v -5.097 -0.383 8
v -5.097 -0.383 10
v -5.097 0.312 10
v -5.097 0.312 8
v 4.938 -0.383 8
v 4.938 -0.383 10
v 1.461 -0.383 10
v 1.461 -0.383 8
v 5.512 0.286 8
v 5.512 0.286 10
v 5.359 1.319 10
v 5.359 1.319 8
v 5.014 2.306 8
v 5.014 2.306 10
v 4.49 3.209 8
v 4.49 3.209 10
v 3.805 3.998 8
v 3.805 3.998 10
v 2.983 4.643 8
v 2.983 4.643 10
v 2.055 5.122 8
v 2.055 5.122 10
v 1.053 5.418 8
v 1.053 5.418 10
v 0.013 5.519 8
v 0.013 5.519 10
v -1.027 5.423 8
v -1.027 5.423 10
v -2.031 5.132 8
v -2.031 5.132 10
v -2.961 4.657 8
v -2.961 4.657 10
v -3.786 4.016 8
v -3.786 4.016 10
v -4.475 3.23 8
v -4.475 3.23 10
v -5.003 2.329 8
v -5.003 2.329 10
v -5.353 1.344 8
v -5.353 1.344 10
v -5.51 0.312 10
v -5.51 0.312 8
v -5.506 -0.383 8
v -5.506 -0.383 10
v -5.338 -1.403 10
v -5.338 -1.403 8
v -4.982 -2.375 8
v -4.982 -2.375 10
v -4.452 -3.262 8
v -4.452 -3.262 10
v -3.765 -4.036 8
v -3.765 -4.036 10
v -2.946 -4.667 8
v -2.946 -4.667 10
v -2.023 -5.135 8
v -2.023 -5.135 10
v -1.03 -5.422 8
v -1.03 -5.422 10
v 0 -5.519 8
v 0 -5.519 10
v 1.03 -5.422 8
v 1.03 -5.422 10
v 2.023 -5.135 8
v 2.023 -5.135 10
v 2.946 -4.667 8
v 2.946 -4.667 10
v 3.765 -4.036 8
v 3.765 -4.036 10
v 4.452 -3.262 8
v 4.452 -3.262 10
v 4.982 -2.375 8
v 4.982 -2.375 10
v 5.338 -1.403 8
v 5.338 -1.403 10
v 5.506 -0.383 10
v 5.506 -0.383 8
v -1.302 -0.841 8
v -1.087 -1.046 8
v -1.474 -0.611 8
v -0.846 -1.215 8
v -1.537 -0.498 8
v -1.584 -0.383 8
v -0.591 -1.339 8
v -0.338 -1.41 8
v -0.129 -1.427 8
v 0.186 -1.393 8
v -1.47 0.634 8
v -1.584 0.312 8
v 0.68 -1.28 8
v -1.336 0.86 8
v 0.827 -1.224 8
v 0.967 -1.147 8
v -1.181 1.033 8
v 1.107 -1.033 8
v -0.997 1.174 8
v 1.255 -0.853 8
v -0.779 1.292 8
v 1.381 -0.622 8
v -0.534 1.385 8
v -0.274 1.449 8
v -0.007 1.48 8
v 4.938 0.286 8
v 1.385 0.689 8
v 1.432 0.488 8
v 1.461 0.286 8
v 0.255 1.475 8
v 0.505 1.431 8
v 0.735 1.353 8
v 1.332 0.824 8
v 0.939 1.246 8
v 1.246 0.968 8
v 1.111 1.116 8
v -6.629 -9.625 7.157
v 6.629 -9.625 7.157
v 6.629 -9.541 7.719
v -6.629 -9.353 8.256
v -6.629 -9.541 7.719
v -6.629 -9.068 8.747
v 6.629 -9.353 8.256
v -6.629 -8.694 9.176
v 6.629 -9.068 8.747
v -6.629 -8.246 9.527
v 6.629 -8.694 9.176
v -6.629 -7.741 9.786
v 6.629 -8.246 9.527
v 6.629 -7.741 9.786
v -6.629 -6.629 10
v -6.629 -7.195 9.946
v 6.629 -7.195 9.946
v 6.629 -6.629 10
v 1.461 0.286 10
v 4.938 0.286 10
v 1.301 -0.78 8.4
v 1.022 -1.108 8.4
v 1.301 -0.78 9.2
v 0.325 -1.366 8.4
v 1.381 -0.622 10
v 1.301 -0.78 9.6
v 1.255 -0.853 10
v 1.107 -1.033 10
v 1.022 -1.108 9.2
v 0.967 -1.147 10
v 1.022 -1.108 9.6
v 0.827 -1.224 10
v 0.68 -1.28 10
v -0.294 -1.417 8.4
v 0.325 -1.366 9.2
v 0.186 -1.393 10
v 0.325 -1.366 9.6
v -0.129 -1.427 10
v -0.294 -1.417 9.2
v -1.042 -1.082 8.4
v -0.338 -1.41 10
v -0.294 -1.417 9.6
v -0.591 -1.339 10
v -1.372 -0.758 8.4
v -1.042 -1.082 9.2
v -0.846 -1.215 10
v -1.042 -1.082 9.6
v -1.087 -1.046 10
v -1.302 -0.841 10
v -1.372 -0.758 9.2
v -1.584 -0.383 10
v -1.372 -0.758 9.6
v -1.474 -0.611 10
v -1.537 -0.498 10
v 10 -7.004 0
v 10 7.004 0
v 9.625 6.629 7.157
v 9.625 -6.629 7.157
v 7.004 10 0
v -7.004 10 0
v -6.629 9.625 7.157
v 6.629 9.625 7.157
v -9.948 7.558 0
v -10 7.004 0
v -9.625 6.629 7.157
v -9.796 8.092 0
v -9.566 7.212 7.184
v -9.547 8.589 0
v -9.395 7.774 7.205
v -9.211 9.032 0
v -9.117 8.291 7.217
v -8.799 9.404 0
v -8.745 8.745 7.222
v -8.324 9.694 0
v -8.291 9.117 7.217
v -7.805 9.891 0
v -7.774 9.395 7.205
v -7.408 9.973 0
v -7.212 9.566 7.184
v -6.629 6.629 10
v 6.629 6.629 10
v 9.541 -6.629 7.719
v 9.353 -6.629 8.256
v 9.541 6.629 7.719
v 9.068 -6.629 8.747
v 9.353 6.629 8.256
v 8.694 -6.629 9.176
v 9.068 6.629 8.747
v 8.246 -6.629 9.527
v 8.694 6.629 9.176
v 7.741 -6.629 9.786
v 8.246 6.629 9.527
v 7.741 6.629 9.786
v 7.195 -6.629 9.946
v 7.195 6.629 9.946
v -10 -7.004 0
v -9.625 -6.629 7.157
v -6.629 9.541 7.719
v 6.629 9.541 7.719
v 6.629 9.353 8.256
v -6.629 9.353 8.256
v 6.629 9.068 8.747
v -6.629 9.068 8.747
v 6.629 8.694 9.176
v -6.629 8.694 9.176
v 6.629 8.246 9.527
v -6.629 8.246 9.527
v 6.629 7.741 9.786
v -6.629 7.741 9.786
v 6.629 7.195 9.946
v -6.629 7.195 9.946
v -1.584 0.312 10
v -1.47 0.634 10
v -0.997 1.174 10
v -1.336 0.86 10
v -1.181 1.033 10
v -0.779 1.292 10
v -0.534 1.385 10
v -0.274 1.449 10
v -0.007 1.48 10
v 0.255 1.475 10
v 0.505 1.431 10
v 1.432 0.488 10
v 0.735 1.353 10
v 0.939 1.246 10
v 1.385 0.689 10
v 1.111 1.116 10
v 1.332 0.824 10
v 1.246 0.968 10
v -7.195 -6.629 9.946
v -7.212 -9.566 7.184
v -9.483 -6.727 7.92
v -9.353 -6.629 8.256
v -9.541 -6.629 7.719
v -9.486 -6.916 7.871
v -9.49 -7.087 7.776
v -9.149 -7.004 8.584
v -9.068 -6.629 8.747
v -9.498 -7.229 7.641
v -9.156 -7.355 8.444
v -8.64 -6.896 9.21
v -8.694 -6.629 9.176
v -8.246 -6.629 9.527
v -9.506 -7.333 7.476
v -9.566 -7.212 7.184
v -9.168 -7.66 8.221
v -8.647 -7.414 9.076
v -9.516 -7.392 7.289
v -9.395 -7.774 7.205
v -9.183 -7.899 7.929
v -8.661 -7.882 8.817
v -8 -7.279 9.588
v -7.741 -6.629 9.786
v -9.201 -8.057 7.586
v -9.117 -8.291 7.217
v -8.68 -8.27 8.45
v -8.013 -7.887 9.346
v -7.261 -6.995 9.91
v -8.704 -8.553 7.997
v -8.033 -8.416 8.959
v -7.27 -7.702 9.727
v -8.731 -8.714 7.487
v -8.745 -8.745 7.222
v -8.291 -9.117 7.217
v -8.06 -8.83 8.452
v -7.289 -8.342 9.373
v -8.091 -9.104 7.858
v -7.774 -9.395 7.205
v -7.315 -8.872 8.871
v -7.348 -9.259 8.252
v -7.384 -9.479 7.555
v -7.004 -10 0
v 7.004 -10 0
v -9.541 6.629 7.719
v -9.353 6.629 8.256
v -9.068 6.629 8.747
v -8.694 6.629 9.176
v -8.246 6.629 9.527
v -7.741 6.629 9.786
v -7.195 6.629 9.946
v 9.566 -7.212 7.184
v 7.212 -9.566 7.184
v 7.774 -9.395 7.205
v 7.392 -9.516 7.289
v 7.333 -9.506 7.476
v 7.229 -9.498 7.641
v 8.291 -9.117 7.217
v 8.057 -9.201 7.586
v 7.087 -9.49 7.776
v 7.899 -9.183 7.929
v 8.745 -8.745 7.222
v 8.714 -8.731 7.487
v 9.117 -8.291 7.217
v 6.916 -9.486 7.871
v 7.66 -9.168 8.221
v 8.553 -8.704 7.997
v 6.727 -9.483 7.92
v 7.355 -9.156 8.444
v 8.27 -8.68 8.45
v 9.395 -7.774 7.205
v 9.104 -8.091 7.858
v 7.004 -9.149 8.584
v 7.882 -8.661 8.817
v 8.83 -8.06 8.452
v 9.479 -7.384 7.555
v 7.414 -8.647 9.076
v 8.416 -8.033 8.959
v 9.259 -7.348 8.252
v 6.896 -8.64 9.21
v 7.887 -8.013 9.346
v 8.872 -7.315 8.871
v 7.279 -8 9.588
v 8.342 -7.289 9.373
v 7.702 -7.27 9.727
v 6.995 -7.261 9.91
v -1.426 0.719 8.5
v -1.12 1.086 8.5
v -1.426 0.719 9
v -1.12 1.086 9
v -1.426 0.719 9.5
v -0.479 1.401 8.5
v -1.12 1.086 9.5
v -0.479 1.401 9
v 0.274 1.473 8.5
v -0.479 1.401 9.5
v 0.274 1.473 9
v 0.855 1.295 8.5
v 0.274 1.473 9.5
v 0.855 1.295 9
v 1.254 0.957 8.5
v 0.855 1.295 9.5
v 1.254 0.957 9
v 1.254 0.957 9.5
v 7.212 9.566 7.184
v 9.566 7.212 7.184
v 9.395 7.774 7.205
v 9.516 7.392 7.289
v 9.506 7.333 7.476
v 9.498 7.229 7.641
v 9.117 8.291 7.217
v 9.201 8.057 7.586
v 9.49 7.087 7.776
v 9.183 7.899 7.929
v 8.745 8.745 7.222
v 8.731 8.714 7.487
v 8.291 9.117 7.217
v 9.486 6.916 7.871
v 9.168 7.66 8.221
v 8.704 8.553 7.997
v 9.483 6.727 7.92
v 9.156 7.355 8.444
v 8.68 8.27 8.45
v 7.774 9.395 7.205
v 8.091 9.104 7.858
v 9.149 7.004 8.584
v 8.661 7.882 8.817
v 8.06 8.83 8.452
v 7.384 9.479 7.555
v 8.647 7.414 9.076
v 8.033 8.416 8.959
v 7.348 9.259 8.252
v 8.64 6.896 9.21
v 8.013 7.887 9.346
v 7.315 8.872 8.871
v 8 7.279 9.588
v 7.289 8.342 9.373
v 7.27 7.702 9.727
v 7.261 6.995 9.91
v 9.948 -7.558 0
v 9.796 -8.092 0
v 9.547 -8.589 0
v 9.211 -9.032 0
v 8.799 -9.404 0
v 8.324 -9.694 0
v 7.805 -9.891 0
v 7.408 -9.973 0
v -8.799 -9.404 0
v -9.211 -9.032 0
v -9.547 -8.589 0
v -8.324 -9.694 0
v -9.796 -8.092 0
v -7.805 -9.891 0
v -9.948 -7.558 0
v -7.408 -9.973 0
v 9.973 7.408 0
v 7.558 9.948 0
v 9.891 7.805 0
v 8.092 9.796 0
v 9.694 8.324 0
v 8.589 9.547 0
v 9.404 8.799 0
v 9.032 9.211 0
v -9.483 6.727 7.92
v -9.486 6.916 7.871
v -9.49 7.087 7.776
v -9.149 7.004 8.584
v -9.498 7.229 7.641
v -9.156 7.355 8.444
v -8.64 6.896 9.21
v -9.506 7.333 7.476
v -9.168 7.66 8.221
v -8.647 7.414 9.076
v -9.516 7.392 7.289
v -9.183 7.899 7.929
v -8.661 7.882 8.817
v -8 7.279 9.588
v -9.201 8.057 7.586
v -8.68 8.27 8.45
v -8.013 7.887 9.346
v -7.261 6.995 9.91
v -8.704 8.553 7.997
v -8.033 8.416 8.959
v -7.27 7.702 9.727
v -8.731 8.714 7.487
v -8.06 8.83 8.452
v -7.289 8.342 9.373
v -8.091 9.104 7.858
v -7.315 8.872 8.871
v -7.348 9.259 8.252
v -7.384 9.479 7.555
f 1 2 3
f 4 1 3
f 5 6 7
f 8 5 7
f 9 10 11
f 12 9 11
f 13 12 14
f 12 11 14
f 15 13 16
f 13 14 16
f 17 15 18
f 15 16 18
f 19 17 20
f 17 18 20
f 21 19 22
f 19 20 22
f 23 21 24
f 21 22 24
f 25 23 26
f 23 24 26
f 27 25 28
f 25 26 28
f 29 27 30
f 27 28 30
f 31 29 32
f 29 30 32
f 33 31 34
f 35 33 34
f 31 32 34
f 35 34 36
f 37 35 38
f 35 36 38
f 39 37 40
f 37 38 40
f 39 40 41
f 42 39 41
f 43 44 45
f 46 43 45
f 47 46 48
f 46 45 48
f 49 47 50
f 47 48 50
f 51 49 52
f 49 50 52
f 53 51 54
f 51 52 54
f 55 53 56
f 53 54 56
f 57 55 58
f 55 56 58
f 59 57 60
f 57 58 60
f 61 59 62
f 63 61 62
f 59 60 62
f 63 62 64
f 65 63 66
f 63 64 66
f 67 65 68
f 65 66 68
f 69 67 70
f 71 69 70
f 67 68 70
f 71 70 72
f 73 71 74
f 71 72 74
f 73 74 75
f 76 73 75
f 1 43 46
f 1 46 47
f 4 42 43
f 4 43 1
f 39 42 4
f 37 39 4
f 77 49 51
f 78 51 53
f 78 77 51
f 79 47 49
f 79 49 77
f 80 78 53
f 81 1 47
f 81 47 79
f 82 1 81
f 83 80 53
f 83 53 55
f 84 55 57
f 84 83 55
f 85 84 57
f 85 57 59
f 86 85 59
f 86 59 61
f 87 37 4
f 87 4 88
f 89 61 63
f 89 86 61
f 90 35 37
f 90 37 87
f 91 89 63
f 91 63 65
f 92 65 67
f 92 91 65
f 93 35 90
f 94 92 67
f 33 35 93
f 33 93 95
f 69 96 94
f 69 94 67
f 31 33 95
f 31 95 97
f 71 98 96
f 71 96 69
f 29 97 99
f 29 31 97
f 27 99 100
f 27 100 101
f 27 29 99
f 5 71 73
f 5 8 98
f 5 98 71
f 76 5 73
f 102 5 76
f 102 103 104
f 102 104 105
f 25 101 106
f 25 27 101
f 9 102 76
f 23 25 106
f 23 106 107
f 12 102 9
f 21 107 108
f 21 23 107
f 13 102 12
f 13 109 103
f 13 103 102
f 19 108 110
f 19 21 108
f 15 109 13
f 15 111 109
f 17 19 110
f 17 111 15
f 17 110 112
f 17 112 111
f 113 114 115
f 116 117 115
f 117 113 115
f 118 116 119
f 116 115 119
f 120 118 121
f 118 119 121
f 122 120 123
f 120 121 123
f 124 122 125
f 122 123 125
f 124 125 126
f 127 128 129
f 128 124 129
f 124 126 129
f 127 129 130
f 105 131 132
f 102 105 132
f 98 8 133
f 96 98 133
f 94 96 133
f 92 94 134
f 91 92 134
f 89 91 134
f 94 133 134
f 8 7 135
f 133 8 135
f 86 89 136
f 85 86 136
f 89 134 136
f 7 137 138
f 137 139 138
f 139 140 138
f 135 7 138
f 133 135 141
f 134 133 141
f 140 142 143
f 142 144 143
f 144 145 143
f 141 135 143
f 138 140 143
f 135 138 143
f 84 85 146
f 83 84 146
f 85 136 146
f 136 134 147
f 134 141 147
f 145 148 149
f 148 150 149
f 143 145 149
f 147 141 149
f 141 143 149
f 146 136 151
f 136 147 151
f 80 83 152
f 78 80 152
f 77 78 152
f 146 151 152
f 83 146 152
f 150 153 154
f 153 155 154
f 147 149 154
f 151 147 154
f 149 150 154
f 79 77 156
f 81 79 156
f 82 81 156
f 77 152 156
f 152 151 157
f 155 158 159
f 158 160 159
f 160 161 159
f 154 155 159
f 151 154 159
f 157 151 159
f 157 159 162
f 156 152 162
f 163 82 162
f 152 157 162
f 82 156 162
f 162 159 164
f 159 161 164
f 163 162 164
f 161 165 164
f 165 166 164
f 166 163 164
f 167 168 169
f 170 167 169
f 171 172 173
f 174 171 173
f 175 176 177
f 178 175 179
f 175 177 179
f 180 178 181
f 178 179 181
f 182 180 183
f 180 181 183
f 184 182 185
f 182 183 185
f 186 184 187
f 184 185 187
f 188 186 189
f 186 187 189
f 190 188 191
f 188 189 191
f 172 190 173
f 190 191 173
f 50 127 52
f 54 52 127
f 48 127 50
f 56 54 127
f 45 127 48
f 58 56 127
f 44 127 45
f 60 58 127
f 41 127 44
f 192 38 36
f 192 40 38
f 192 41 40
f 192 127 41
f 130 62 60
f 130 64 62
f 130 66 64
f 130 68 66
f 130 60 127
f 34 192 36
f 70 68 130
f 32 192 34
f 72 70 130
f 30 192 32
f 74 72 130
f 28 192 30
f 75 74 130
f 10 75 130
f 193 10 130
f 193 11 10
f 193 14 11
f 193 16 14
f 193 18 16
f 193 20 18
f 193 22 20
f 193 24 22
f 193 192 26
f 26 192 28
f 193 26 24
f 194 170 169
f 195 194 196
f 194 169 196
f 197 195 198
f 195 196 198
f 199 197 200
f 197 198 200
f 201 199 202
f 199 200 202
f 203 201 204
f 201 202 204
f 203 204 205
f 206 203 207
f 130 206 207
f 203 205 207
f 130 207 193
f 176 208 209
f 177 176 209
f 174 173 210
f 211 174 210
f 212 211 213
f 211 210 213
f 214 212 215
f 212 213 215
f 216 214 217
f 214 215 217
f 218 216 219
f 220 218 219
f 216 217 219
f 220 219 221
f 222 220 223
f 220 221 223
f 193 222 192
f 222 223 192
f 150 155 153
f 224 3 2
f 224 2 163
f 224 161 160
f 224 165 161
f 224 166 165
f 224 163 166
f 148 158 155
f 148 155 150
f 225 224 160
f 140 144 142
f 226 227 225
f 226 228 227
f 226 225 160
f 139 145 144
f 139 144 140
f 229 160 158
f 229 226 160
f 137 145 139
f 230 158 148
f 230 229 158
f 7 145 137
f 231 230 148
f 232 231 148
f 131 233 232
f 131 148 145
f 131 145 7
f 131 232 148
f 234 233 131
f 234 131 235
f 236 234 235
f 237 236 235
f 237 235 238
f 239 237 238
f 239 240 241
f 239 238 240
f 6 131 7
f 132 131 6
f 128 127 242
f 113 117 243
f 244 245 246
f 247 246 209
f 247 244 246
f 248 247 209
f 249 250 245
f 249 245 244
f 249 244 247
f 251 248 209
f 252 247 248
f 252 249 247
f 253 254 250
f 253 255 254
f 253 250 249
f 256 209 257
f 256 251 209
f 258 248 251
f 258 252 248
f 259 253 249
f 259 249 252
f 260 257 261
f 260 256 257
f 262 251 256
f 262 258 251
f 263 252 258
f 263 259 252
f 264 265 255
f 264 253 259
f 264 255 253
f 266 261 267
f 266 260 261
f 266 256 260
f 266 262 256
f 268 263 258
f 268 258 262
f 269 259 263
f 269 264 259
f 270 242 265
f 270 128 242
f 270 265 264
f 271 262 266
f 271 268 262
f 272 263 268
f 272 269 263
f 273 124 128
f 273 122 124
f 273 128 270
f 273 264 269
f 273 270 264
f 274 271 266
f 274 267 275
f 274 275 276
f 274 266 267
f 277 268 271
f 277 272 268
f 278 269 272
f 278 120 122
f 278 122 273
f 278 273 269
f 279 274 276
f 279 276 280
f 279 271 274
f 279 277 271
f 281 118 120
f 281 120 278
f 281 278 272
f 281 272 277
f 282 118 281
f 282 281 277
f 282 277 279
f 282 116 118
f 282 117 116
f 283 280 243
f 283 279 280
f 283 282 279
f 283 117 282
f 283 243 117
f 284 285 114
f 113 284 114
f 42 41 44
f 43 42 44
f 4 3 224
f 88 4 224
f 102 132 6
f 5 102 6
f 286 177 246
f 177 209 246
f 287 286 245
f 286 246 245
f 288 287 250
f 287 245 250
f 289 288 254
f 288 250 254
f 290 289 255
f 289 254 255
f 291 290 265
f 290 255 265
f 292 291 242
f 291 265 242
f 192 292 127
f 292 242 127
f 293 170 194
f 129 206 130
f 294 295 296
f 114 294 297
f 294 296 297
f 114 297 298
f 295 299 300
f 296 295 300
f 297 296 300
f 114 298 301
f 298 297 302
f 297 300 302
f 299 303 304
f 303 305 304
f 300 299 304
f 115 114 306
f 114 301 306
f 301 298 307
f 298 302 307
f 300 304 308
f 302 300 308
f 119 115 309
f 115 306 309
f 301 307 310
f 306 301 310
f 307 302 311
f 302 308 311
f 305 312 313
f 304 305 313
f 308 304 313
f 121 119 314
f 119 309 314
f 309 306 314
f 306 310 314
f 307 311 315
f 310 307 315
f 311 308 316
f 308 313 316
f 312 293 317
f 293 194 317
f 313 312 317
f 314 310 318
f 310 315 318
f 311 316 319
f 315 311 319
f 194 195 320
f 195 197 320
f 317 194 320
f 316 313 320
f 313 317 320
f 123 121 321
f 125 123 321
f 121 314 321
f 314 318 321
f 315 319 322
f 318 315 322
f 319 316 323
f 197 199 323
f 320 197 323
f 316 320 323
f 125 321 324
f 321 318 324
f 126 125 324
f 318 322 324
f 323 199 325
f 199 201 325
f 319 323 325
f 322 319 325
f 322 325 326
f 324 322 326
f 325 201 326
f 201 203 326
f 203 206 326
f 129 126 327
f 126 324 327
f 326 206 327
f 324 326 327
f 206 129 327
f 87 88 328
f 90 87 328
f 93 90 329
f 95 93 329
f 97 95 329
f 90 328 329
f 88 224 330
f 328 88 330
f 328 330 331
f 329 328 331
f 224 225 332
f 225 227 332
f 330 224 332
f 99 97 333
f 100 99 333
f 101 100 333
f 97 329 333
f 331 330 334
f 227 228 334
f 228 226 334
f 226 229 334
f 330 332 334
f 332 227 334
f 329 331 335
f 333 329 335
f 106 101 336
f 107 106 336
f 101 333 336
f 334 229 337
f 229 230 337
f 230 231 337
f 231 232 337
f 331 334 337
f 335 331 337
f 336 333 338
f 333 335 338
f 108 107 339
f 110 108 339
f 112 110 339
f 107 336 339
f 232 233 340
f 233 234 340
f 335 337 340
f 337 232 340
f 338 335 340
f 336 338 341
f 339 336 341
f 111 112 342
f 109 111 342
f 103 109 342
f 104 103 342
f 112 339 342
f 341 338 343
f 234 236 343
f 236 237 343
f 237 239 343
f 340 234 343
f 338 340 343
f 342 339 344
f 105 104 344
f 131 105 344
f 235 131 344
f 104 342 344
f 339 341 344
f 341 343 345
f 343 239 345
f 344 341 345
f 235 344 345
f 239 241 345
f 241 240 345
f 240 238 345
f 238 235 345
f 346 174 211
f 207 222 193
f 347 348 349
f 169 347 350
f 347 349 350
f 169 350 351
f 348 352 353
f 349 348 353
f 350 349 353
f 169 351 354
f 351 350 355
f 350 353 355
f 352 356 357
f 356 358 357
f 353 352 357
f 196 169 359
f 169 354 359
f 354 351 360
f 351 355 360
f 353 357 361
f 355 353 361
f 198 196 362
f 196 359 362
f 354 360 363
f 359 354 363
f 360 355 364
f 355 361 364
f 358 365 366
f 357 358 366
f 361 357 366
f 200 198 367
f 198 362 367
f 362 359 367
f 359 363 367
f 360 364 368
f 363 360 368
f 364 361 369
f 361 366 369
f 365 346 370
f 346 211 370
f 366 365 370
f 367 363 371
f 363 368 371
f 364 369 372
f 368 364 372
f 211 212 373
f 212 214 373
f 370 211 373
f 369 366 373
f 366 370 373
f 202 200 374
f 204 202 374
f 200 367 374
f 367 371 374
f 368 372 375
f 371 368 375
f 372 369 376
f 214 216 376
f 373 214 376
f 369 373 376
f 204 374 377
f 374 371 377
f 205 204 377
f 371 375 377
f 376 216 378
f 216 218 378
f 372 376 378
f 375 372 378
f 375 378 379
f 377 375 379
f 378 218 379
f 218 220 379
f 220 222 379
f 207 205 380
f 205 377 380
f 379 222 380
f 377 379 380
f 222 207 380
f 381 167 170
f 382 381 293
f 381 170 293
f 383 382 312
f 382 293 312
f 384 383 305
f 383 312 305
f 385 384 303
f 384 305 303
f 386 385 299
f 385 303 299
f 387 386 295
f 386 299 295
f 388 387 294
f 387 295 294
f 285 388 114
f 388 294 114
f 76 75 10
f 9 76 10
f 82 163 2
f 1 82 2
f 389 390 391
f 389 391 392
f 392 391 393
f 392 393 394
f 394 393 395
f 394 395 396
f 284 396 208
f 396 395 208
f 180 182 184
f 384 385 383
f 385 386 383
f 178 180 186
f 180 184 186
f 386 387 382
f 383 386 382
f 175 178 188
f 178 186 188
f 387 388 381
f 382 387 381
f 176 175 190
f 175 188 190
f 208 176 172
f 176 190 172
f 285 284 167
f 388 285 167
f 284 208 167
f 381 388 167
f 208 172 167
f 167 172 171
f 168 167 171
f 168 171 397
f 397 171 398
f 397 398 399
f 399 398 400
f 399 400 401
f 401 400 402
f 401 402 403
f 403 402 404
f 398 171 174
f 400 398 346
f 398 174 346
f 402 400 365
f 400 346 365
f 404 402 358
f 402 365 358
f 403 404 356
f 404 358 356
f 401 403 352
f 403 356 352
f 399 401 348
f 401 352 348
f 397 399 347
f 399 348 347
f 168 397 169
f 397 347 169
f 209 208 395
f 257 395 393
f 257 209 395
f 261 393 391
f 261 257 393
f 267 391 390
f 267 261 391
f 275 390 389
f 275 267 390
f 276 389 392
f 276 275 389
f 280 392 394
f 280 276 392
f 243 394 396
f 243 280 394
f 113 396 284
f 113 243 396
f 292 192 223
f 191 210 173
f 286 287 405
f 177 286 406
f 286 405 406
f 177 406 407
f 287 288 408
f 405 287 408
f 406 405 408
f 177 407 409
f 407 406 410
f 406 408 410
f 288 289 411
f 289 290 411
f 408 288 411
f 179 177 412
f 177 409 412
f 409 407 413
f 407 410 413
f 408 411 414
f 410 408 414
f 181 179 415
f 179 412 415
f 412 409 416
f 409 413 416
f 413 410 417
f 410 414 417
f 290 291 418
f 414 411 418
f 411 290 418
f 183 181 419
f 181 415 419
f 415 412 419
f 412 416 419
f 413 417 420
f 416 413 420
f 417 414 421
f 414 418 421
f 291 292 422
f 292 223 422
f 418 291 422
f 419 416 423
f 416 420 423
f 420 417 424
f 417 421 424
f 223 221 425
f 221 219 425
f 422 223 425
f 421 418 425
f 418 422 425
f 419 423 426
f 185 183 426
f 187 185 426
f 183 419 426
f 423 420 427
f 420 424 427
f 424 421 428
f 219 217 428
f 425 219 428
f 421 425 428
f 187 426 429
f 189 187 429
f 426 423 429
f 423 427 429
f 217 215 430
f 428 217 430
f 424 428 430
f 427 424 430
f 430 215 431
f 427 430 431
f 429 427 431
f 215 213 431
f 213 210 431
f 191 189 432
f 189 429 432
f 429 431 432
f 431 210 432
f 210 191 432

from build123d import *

# Parameters (mm, degrees)
F0_W     = 20
F0_H     = 20
F1_DEPTH = 10
F1_TAPER = 3
F2_R     = 3
F4_DEPTH = 2


with BuildPart() as f1:
    # F0 (on Top) → F1 (new body)
    with BuildSketch(Plane.XY):
        Rectangle(F0_W, F0_H)
    extrude(amount=F1_DEPTH, taper=F1_TAPER)

    # F2
    f2_edges = [f1.edges().sort_by_distance(p)[0] for p in [
        (0, 9.475922, 10),
        (9.737961, 9.737961, 5),
        (9.475922, 0, 10),
        (9.737961, -9.737961, 5),
        (0, -9.475922, 10),
        (-9.475922, 0, 10),
        (-9.737961, -9.737961, 5),
        (-9.737961, 9.737961, 5),
    ]]
    fillet(f2_edges, radius=F2_R)

    # F3 (on face) → F4 (cut)
    with BuildSketch(Plane.XY.offset(10)):
        with BuildLine():
            ThreePointArc((5.5115809634, 0.2857532818), (0.0129202811, 5.5189684471), (-5.5101826217, 0.3115559812))
            Line((-5.5101826217, 0.3115559812), (-5.0968159921, 0.3115559812))
            Line((-5.0968159921, 0.3115559812), (-1.5841760834, 0.3115559812))
            add(Edge.make_bspline(
                [(-1.5841760834, 0.3115559812), (-1.5146037038, 0.5837301371), (-1.2273483423, 1.2298845271), (0.2804225775, 1.6685983953), (1.3624047254, 1.0479713111), (1.4321026561, 0.5130518001), (1.4605487231, 0.2857532818)],
                knots=[0, 0, 0, 0, 0.0939716444, 0.212909057, 0.3170188857, 0.399881643, 0.399881643, 0.399881643, 0.399881643], degree=3))
            Line((1.4605487231, 0.2857532818), (4.9382173456, 0.2857532818))
            Line((4.9382173456, 0.2857532818), (5.5115809634, 0.2857532818))
        make_face()
        with BuildLine():
            Line((-5.0968159921, -0.3829301172), (-5.5056828986, -0.3829301172))
            ThreePointArc((-5.5056828986, -0.3829301172), (0, -5.5189835707), (5.5056828986, -0.3829301172))
            Line((5.5056828986, -0.3829301172), (4.9382173456, -0.3829301172))
            Line((4.9382173456, -0.3829301172), (1.4605487231, -0.3829301172))
            add(Edge.make_bspline(
                [(1.4605487231, -0.3829301172), (1.400668735, -0.6466191855), (1.09179653, -1.2105707709), (0.3230563372, -1.3669788929), (-0.3039180378, -1.4893536378), (-1.0857394106, -1.1379114959), (-1.4961255451, -0.6391379868), (-1.5841760834, -0.3829301172)],
                knots=[0.480759332, 0.480759332, 0.480759332, 0.480759332, 0.5717887242, 0.6570378834, 0.7350044671, 0.8245681269, 0.917576654, 0.917576654, 0.917576654, 0.917576654], degree=3))
            Line((-1.5841760834, -0.3829301172), (-5.0968159921, -0.3829301172))
        make_face()
        Polygon((-5.5101826217, 0.3115559812), (-5.5056828986, -0.3829301172), (-5.0968159921, -0.3829301172), (-5.0968159921, 0.3115559812), align=None)
        Polygon((4.9382173456, -0.3829301172), (5.5056828986, -0.3829301172), (5.5115809634, 0.2857532818), (4.9382173456, 0.2857532818), align=None)
    extrude(amount=-F4_DEPTH, mode=Mode.SUBTRACT)


solid = f1.part
